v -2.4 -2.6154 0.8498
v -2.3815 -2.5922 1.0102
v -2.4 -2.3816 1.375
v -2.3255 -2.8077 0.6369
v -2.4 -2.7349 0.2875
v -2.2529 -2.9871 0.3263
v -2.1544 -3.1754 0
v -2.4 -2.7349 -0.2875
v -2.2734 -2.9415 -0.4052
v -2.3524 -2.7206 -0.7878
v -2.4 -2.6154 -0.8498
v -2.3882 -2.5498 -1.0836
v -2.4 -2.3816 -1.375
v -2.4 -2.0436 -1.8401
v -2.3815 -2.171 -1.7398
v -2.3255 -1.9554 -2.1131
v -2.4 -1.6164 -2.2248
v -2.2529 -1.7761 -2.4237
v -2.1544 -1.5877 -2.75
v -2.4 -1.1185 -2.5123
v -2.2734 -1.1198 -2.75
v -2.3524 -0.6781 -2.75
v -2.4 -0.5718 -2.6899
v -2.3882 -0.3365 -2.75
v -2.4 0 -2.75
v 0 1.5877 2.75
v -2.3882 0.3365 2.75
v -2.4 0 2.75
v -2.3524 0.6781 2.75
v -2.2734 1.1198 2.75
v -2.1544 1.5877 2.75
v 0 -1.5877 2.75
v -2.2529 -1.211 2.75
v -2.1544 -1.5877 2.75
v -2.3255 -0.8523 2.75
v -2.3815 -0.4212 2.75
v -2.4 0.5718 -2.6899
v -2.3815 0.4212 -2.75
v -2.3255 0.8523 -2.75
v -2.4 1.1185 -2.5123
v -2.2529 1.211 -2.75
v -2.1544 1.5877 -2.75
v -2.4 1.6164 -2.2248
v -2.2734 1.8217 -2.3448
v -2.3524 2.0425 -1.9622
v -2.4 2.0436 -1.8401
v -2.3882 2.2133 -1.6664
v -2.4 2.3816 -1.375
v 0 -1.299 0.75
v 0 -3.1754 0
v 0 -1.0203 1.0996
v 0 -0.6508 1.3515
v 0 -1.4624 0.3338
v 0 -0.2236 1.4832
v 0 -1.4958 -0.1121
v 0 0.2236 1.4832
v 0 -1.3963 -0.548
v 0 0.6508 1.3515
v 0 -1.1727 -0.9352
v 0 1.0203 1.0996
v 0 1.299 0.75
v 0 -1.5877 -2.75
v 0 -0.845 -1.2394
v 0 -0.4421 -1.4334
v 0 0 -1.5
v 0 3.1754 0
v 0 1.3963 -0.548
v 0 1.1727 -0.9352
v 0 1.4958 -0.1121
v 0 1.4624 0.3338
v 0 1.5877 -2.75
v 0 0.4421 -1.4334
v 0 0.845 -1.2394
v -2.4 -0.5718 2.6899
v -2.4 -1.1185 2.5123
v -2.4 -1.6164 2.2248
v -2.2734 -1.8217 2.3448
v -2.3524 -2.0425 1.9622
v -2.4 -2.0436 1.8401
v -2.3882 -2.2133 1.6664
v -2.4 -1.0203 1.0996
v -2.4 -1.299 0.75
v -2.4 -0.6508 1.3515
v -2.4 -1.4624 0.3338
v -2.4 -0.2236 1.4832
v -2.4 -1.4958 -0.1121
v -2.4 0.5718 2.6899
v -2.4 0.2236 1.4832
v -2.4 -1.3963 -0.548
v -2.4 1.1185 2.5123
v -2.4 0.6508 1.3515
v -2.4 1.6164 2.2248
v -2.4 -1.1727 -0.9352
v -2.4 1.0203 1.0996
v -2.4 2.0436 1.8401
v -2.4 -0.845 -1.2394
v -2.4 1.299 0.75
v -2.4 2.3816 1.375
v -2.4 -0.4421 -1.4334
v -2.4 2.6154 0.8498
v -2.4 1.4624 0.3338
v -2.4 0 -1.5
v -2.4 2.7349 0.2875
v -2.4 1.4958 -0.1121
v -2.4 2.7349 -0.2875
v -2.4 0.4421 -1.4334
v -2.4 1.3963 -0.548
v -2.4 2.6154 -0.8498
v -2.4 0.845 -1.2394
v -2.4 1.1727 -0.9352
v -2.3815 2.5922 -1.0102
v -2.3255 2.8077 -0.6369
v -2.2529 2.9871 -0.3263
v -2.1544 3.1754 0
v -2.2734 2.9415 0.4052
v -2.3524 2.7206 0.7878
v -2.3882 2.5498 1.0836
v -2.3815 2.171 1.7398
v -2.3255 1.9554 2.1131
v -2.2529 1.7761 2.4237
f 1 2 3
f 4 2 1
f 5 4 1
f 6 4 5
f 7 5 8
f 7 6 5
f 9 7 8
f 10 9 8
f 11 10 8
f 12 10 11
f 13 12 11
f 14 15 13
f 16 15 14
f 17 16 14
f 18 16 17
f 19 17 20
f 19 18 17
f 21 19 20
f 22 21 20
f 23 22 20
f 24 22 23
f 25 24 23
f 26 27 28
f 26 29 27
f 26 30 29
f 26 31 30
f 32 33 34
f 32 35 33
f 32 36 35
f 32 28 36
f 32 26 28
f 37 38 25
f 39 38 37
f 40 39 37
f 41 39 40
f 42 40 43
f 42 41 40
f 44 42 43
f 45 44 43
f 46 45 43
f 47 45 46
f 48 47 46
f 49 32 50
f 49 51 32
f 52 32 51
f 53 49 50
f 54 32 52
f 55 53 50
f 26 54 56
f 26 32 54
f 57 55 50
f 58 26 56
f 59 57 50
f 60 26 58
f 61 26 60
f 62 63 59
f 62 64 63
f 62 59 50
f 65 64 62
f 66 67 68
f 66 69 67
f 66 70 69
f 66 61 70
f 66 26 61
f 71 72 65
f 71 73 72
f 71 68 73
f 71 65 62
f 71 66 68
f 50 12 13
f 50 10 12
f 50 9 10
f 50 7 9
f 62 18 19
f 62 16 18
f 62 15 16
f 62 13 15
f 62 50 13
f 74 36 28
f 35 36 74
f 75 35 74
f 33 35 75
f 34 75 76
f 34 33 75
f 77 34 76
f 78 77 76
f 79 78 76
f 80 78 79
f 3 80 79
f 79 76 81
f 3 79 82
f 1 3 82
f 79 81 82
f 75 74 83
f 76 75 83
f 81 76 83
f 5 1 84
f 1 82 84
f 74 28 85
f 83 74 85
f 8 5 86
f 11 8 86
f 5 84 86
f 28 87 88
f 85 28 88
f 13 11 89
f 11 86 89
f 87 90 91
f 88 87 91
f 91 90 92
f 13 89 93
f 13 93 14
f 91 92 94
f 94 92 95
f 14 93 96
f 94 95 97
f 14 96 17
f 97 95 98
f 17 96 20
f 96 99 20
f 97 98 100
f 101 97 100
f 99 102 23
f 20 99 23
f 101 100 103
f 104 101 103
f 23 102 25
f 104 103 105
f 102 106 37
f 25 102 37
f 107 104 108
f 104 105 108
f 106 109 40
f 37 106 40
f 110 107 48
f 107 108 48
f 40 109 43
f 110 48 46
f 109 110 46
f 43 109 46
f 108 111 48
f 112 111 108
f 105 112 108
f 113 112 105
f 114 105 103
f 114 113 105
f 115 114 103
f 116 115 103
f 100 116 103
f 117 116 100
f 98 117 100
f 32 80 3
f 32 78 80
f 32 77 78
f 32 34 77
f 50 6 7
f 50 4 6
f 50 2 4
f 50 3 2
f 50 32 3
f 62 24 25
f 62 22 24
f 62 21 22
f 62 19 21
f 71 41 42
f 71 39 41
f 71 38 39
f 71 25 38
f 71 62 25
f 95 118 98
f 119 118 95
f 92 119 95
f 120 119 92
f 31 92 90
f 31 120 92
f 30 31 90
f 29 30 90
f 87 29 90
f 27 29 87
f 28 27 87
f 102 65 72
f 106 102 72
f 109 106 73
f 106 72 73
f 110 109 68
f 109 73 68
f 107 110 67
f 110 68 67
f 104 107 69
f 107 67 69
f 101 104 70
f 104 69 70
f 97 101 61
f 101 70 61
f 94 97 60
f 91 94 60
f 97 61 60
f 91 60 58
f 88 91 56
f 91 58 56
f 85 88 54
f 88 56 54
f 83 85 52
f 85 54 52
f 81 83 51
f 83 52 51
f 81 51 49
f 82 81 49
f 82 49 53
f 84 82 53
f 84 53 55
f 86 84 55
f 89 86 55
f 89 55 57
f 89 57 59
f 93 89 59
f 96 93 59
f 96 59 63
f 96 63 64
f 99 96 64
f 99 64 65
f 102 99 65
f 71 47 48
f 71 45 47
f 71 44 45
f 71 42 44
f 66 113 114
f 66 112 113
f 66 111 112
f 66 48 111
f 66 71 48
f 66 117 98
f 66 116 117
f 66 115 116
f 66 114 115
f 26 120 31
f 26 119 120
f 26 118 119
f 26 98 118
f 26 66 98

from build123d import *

# Parameters (mm, degrees)
BOSS_EXTRUDE1_DEPTH = 2.4
SKETCH8_R           = 1.5
CUT_EXTRUDE1_DEPTH  = 5.837957558


with BuildPart() as part:
    # Sketch1 → Boss-Extrude1 (new body)
    with BuildSketch(Plane(origin=(0, 0, 0), x_dir=(0, 0, -1), z_dir=(1, 0, 0))):
        Polygon((0, 3.175426481), (-2.75, 1.58771324), (-2.75, -1.58771324), (0, -3.175426481), (2.75, -1.58771324), (2.75, 1.58771324), align=None)
    extrude(amount=-BOSS_EXTRUDE1_DEPTH)

    # Sketch2 → Cut-Revolve1 (revolve, cut)
    with BuildSketch(Plane.XY):
        Polygon((-2.4, 2.75), (-2.154379907, 3.175426481), (-2.4, 3.175426481), align=None)
    revolve(axis=Axis((-2.23854625, 0, 0), (1, 0, 0)), mode=Mode.SUBTRACT)

    # Sketch8 → Cut-Extrude1 (cut, through all)
    with BuildSketch(Plane(origin=(0, 0, 0), x_dir=(0, 0, -1), z_dir=(1, 0, 0))):
        Circle(SKETCH8_R)
    extrude(amount=-CUT_EXTRUDE1_DEPTH, mode=Mode.SUBTRACT)


solid = part.part
